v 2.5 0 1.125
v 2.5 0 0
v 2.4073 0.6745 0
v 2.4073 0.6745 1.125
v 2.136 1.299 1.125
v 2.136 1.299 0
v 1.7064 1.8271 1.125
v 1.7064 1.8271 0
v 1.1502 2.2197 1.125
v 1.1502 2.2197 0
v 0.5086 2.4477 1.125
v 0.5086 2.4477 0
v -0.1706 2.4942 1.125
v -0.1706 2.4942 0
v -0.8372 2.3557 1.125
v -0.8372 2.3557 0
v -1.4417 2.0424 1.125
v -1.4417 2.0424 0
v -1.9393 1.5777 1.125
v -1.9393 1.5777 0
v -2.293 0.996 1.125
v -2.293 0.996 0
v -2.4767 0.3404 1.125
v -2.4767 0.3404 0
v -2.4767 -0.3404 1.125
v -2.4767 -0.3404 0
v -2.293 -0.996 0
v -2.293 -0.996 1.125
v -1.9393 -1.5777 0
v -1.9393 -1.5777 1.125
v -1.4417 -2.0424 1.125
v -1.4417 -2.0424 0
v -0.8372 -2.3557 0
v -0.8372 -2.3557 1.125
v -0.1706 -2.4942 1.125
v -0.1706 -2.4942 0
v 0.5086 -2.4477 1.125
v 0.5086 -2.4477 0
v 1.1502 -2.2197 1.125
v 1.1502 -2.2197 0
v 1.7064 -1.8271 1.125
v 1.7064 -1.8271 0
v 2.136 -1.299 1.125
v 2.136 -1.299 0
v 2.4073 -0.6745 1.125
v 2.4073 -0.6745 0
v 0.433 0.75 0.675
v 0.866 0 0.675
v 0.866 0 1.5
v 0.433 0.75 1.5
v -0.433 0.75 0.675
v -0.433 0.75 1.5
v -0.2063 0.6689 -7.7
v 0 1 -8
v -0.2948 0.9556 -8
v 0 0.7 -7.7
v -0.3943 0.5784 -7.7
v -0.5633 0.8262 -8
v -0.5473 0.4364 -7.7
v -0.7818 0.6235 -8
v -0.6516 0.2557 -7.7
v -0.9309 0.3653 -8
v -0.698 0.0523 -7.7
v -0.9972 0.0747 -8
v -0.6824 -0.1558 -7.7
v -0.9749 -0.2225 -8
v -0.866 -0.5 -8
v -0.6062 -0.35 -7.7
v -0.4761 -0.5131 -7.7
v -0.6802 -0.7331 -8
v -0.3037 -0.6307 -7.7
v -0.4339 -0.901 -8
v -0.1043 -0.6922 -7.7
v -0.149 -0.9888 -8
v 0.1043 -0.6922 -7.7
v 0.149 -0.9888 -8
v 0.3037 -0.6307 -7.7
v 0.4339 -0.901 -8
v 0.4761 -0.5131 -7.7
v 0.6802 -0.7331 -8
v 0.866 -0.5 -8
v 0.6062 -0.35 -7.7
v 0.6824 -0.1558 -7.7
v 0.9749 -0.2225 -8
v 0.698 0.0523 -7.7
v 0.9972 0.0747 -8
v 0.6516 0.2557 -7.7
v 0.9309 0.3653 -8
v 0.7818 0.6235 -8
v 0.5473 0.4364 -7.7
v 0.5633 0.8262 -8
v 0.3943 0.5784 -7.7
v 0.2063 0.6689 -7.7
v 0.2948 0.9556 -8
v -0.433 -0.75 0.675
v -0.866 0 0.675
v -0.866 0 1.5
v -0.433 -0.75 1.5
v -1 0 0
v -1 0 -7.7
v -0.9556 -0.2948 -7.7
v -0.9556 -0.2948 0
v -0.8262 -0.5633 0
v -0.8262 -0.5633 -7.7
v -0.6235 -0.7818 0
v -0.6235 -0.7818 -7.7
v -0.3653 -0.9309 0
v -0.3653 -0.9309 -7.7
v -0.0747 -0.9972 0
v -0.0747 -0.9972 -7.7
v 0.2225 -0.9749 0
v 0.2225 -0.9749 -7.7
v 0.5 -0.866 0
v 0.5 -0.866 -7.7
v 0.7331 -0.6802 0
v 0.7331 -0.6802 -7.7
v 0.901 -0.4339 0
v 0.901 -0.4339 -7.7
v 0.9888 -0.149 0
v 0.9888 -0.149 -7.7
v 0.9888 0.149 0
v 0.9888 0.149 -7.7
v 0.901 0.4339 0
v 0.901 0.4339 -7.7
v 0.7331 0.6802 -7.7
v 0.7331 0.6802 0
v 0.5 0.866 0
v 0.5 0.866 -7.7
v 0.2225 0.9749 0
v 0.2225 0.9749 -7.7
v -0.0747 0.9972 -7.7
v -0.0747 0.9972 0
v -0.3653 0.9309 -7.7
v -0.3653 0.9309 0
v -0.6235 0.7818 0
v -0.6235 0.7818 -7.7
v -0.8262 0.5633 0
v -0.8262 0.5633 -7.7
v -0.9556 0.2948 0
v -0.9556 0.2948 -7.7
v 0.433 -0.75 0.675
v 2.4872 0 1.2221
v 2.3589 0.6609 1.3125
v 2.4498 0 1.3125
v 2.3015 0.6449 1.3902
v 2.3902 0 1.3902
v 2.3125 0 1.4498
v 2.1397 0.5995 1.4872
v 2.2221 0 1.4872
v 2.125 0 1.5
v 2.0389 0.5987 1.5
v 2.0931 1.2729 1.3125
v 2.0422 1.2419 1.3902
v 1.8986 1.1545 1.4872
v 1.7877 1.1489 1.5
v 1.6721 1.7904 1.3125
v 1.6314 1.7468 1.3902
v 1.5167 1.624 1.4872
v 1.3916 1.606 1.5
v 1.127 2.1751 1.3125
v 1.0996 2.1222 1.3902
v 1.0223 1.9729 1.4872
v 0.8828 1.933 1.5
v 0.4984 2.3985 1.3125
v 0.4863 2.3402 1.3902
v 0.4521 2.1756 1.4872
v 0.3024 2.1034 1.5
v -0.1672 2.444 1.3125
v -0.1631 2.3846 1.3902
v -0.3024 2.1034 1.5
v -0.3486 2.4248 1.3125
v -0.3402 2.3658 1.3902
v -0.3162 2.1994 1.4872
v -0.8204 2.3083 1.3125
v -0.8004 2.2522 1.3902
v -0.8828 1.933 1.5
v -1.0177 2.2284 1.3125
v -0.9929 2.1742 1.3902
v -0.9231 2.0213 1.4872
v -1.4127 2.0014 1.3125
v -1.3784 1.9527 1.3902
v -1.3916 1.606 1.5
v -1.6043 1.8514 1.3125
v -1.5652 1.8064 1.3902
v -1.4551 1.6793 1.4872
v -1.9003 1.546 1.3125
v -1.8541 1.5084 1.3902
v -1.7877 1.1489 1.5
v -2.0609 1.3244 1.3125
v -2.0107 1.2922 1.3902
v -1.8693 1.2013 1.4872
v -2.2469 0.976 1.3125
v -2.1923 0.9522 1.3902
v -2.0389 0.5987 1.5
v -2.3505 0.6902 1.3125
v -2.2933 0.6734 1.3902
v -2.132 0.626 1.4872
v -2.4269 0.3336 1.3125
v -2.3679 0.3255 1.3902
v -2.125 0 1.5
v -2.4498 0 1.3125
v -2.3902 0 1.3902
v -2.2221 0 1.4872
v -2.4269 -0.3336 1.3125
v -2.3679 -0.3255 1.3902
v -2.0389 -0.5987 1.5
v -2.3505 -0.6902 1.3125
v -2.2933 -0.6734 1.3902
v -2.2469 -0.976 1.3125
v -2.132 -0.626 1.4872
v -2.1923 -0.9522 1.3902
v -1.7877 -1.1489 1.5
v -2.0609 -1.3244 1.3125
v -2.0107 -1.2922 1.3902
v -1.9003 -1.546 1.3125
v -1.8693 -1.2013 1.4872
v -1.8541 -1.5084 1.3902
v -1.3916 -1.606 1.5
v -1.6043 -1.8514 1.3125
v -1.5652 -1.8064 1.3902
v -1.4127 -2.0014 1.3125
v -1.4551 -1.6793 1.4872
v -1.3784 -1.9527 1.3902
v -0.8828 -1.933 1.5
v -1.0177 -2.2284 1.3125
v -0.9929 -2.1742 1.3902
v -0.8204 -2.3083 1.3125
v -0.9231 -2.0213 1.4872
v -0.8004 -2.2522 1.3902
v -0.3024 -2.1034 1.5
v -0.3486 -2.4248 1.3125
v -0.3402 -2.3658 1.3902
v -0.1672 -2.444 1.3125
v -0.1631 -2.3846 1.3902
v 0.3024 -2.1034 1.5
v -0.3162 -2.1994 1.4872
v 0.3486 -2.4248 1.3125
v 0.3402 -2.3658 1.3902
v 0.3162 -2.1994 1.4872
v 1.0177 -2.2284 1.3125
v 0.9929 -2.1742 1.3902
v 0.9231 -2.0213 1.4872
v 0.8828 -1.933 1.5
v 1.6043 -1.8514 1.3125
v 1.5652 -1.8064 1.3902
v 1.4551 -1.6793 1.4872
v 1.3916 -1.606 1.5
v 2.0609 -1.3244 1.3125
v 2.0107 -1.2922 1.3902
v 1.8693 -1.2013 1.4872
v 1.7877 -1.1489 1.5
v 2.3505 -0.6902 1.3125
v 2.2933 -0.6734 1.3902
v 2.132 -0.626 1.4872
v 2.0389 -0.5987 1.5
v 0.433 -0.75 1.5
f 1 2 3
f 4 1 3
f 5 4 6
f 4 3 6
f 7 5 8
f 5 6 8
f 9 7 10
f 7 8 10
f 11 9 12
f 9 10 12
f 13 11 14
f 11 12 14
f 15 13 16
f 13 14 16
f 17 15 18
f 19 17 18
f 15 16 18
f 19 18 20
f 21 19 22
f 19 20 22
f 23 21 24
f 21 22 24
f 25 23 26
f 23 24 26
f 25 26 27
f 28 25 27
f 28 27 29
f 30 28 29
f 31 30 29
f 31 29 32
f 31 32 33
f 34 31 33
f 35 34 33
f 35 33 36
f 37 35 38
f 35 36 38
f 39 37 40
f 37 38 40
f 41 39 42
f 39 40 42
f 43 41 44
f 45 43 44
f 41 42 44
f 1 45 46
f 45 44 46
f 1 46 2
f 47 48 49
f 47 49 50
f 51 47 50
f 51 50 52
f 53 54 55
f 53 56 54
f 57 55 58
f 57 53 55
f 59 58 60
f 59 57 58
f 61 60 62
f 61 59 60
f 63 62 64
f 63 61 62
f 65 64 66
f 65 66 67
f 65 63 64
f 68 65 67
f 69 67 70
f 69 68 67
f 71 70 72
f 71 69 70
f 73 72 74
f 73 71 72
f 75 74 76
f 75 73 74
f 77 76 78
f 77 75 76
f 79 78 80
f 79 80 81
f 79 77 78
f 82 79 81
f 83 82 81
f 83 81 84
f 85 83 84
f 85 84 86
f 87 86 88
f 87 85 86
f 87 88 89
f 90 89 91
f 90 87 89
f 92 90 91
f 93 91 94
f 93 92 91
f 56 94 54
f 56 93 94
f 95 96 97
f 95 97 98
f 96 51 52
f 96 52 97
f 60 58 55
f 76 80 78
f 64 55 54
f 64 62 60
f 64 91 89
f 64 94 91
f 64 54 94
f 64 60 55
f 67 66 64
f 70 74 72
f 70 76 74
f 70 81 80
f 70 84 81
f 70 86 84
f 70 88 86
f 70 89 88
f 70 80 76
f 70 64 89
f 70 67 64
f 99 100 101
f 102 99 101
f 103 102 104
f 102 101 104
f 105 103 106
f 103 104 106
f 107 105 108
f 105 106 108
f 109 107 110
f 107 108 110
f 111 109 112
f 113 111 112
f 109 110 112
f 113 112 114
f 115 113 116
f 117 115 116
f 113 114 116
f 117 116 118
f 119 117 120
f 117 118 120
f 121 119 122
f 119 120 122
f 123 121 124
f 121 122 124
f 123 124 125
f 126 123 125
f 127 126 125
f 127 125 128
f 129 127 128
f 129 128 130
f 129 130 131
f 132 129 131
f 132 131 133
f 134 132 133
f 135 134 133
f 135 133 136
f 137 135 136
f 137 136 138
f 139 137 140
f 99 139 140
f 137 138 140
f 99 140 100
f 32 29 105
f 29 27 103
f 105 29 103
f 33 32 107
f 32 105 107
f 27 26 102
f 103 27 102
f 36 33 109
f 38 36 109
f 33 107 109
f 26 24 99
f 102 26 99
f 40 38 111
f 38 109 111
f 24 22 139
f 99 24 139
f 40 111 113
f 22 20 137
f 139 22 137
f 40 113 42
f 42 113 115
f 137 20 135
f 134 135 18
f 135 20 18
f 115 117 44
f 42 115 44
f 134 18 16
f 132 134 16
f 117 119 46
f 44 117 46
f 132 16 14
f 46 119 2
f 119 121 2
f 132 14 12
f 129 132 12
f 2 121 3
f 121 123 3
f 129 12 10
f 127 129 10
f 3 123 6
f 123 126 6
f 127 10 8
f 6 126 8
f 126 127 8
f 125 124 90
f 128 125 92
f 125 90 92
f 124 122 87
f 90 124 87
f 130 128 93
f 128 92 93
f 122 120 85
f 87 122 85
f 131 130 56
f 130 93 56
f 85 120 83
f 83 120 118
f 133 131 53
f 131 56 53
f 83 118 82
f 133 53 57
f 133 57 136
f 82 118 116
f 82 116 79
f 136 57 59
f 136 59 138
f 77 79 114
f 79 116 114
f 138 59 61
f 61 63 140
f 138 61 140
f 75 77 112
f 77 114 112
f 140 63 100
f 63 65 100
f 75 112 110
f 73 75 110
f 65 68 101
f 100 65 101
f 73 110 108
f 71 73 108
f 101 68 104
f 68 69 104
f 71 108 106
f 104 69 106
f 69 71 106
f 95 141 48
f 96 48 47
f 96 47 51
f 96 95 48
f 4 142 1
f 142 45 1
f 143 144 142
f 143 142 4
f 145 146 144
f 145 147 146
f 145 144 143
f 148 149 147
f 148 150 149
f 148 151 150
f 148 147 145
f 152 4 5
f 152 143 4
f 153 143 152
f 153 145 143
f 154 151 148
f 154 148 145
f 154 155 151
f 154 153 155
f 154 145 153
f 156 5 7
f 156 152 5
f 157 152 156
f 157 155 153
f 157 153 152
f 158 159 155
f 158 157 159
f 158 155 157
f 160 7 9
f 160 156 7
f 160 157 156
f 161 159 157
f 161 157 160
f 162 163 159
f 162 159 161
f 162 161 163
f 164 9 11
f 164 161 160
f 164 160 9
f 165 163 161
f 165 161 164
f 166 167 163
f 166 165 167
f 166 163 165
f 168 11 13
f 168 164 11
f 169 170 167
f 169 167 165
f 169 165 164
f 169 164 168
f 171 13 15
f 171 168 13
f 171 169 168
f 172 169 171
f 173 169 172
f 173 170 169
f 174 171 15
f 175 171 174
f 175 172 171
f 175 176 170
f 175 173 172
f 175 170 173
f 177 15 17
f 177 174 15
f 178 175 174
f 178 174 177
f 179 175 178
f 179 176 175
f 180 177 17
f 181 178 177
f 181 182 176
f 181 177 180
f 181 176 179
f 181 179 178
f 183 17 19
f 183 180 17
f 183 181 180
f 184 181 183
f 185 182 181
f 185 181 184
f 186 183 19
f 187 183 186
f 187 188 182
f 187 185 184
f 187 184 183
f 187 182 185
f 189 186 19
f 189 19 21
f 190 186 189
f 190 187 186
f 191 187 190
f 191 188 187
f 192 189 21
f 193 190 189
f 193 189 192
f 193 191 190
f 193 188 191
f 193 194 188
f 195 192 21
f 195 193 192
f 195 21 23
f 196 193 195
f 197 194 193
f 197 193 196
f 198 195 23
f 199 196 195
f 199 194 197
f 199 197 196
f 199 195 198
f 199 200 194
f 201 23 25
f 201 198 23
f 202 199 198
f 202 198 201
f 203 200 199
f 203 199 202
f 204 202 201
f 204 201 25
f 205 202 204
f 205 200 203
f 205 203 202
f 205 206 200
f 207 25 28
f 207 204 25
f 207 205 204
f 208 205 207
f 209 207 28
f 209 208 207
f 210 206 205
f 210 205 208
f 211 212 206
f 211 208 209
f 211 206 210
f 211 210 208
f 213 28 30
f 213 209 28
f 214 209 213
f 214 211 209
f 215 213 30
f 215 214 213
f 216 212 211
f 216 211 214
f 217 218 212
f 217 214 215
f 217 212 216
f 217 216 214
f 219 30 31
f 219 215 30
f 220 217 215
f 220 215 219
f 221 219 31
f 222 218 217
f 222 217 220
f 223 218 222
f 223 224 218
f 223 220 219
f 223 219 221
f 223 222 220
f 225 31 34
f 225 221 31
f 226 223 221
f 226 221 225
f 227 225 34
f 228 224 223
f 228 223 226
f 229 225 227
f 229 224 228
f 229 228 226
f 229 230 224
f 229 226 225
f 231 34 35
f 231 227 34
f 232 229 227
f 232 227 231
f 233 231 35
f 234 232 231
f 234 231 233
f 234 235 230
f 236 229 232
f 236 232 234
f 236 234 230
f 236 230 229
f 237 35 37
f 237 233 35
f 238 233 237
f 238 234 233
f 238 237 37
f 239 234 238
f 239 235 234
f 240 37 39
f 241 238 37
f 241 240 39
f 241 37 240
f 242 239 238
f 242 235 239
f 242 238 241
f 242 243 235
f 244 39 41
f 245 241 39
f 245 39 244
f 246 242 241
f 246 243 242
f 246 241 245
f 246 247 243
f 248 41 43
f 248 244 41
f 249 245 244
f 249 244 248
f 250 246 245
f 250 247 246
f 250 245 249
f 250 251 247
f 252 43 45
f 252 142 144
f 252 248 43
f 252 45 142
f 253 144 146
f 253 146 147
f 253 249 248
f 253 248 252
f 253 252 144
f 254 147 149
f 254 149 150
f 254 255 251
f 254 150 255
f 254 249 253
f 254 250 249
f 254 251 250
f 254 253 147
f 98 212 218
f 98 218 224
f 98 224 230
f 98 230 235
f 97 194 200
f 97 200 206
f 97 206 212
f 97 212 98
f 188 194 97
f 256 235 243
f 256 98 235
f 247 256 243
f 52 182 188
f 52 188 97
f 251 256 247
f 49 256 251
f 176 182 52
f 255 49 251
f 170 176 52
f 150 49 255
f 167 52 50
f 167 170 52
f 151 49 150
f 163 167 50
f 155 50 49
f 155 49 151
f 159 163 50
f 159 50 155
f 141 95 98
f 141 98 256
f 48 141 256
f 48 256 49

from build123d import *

# Parameters (mm, degrees)
F_0150_CYLINDER_SKETCH_R    = 2.5
F_0150_CYLINDER_DEPTH       = 1.5
F_0151_FILLET_R             = 0.375
F_0152_EXTRUDE_DEPTH        = 0.835
F_0152_EXTRUDE_ROTATE_ANGLE = 120
F_0155_CYLINDER_SKETCH_R    = 1
F_0155_CYLINDER_DEPTH       = 7.7
F_0156_CONE_ROTATE_ANGLE    = 90


with BuildPart() as part:
    # 0150_cylinder_Sketch → 0150_cylinder (new body)
    with BuildSketch(Plane.XY):
        Circle(F_0150_CYLINDER_SKETCH_R)
    extrude(amount=F_0150_CYLINDER_DEPTH)

    # 0151_fillet
    f_0151_fillet_edges = [part.edges().sort_by_distance(p)[0] for p in [
        (-2.5, 0, 1.5),
    ]]
    fillet(f_0151_fillet_edges, radius=F_0151_FILLET_R)


with BuildPart() as body_2:
    # 0152_extrude_Sketch → 0152_extrude (new body)
    with BuildSketch(Plane.XY):
        Polygon((0, 0), (0.866025404, 0), (1.299038106, 0.75), (0.866025404, 1.5), (0, 1.5), (-0.433012702, 0.75), align=None)
    extrude(amount=F_0152_EXTRUDE_DEPTH)


with BuildPart() as body_2_1:
    # 0152_extrude_Rotate: read off the stored shape, not the designer's step
    # 0152_extrude_Rotate: moved
    add(body_2.part.rotate(Axis((0, 0, 0), (0, 0, 1)), F_0152_EXTRUDE_ROTATE_ANGLE))


with BuildPart() as body_2_2:
    # 0152_extrude_Translate: moved
    add(body_2_1.part.moved(Location((0.866025404, 0, 0.675))))


with BuildPart() as part_1:
    add(part.part)

    # 0154_sub: cut body 2
    add(body_2_2.part, mode=Mode.SUBTRACT)


with BuildPart() as body_2_2_1:
    # 0155_cylinder_Sketch → 0155_cylinder (new body)
    with BuildSketch(Plane.XY):
        with Locations(Location((0, 0, 0), (0, 0, 180))):
            Circle(F_0155_CYLINDER_SKETCH_R)
    extrude(amount=F_0155_CYLINDER_DEPTH)


with BuildPart() as body_2_2_2:
    # 0155_cylinder_Translate: moved
    add(body_2_2_1.part.moved(Location((0, 0, -7.7))))


with BuildPart() as body_3:
    # 0156_cone_Sketch → 0156_cone (revolve)
    with BuildSketch(Plane.XY, mode=Mode.PRIVATE) as f_0156_cone_sk:
        Polygon((0, 0), (1, 0), (0.7, 0.3), (0, 0.3), align=None)
    revolve(f_0156_cone_sk.sketch.rotate(Axis((0, -100, 0), (0, 1, 0)), 90), axis=Axis((0, -100, 0), (0, 1, 0)))


with BuildPart() as body_3_1:
    # 0156_cone_Rotate: moved
    add(body_3.part.rotate(Axis((0, 0, 0), (1, 0, 0)), F_0156_CONE_ROTATE_ANGLE))


with BuildPart() as body_3_2:
    # 0156_cone_Translate: moved
    add(body_3_1.part.moved(Location((0, 0, -8))))


with BuildPart() as body_2_2_3:
    add(body_2_2_2.part)

    # 0158_add: union body 3
    add(body_3_2.part)


with BuildPart() as part_2:
    add(part_1.part)

    # 0159_add: union body 2 2
    add(body_2_2_3.part)


solid = part_2.part
